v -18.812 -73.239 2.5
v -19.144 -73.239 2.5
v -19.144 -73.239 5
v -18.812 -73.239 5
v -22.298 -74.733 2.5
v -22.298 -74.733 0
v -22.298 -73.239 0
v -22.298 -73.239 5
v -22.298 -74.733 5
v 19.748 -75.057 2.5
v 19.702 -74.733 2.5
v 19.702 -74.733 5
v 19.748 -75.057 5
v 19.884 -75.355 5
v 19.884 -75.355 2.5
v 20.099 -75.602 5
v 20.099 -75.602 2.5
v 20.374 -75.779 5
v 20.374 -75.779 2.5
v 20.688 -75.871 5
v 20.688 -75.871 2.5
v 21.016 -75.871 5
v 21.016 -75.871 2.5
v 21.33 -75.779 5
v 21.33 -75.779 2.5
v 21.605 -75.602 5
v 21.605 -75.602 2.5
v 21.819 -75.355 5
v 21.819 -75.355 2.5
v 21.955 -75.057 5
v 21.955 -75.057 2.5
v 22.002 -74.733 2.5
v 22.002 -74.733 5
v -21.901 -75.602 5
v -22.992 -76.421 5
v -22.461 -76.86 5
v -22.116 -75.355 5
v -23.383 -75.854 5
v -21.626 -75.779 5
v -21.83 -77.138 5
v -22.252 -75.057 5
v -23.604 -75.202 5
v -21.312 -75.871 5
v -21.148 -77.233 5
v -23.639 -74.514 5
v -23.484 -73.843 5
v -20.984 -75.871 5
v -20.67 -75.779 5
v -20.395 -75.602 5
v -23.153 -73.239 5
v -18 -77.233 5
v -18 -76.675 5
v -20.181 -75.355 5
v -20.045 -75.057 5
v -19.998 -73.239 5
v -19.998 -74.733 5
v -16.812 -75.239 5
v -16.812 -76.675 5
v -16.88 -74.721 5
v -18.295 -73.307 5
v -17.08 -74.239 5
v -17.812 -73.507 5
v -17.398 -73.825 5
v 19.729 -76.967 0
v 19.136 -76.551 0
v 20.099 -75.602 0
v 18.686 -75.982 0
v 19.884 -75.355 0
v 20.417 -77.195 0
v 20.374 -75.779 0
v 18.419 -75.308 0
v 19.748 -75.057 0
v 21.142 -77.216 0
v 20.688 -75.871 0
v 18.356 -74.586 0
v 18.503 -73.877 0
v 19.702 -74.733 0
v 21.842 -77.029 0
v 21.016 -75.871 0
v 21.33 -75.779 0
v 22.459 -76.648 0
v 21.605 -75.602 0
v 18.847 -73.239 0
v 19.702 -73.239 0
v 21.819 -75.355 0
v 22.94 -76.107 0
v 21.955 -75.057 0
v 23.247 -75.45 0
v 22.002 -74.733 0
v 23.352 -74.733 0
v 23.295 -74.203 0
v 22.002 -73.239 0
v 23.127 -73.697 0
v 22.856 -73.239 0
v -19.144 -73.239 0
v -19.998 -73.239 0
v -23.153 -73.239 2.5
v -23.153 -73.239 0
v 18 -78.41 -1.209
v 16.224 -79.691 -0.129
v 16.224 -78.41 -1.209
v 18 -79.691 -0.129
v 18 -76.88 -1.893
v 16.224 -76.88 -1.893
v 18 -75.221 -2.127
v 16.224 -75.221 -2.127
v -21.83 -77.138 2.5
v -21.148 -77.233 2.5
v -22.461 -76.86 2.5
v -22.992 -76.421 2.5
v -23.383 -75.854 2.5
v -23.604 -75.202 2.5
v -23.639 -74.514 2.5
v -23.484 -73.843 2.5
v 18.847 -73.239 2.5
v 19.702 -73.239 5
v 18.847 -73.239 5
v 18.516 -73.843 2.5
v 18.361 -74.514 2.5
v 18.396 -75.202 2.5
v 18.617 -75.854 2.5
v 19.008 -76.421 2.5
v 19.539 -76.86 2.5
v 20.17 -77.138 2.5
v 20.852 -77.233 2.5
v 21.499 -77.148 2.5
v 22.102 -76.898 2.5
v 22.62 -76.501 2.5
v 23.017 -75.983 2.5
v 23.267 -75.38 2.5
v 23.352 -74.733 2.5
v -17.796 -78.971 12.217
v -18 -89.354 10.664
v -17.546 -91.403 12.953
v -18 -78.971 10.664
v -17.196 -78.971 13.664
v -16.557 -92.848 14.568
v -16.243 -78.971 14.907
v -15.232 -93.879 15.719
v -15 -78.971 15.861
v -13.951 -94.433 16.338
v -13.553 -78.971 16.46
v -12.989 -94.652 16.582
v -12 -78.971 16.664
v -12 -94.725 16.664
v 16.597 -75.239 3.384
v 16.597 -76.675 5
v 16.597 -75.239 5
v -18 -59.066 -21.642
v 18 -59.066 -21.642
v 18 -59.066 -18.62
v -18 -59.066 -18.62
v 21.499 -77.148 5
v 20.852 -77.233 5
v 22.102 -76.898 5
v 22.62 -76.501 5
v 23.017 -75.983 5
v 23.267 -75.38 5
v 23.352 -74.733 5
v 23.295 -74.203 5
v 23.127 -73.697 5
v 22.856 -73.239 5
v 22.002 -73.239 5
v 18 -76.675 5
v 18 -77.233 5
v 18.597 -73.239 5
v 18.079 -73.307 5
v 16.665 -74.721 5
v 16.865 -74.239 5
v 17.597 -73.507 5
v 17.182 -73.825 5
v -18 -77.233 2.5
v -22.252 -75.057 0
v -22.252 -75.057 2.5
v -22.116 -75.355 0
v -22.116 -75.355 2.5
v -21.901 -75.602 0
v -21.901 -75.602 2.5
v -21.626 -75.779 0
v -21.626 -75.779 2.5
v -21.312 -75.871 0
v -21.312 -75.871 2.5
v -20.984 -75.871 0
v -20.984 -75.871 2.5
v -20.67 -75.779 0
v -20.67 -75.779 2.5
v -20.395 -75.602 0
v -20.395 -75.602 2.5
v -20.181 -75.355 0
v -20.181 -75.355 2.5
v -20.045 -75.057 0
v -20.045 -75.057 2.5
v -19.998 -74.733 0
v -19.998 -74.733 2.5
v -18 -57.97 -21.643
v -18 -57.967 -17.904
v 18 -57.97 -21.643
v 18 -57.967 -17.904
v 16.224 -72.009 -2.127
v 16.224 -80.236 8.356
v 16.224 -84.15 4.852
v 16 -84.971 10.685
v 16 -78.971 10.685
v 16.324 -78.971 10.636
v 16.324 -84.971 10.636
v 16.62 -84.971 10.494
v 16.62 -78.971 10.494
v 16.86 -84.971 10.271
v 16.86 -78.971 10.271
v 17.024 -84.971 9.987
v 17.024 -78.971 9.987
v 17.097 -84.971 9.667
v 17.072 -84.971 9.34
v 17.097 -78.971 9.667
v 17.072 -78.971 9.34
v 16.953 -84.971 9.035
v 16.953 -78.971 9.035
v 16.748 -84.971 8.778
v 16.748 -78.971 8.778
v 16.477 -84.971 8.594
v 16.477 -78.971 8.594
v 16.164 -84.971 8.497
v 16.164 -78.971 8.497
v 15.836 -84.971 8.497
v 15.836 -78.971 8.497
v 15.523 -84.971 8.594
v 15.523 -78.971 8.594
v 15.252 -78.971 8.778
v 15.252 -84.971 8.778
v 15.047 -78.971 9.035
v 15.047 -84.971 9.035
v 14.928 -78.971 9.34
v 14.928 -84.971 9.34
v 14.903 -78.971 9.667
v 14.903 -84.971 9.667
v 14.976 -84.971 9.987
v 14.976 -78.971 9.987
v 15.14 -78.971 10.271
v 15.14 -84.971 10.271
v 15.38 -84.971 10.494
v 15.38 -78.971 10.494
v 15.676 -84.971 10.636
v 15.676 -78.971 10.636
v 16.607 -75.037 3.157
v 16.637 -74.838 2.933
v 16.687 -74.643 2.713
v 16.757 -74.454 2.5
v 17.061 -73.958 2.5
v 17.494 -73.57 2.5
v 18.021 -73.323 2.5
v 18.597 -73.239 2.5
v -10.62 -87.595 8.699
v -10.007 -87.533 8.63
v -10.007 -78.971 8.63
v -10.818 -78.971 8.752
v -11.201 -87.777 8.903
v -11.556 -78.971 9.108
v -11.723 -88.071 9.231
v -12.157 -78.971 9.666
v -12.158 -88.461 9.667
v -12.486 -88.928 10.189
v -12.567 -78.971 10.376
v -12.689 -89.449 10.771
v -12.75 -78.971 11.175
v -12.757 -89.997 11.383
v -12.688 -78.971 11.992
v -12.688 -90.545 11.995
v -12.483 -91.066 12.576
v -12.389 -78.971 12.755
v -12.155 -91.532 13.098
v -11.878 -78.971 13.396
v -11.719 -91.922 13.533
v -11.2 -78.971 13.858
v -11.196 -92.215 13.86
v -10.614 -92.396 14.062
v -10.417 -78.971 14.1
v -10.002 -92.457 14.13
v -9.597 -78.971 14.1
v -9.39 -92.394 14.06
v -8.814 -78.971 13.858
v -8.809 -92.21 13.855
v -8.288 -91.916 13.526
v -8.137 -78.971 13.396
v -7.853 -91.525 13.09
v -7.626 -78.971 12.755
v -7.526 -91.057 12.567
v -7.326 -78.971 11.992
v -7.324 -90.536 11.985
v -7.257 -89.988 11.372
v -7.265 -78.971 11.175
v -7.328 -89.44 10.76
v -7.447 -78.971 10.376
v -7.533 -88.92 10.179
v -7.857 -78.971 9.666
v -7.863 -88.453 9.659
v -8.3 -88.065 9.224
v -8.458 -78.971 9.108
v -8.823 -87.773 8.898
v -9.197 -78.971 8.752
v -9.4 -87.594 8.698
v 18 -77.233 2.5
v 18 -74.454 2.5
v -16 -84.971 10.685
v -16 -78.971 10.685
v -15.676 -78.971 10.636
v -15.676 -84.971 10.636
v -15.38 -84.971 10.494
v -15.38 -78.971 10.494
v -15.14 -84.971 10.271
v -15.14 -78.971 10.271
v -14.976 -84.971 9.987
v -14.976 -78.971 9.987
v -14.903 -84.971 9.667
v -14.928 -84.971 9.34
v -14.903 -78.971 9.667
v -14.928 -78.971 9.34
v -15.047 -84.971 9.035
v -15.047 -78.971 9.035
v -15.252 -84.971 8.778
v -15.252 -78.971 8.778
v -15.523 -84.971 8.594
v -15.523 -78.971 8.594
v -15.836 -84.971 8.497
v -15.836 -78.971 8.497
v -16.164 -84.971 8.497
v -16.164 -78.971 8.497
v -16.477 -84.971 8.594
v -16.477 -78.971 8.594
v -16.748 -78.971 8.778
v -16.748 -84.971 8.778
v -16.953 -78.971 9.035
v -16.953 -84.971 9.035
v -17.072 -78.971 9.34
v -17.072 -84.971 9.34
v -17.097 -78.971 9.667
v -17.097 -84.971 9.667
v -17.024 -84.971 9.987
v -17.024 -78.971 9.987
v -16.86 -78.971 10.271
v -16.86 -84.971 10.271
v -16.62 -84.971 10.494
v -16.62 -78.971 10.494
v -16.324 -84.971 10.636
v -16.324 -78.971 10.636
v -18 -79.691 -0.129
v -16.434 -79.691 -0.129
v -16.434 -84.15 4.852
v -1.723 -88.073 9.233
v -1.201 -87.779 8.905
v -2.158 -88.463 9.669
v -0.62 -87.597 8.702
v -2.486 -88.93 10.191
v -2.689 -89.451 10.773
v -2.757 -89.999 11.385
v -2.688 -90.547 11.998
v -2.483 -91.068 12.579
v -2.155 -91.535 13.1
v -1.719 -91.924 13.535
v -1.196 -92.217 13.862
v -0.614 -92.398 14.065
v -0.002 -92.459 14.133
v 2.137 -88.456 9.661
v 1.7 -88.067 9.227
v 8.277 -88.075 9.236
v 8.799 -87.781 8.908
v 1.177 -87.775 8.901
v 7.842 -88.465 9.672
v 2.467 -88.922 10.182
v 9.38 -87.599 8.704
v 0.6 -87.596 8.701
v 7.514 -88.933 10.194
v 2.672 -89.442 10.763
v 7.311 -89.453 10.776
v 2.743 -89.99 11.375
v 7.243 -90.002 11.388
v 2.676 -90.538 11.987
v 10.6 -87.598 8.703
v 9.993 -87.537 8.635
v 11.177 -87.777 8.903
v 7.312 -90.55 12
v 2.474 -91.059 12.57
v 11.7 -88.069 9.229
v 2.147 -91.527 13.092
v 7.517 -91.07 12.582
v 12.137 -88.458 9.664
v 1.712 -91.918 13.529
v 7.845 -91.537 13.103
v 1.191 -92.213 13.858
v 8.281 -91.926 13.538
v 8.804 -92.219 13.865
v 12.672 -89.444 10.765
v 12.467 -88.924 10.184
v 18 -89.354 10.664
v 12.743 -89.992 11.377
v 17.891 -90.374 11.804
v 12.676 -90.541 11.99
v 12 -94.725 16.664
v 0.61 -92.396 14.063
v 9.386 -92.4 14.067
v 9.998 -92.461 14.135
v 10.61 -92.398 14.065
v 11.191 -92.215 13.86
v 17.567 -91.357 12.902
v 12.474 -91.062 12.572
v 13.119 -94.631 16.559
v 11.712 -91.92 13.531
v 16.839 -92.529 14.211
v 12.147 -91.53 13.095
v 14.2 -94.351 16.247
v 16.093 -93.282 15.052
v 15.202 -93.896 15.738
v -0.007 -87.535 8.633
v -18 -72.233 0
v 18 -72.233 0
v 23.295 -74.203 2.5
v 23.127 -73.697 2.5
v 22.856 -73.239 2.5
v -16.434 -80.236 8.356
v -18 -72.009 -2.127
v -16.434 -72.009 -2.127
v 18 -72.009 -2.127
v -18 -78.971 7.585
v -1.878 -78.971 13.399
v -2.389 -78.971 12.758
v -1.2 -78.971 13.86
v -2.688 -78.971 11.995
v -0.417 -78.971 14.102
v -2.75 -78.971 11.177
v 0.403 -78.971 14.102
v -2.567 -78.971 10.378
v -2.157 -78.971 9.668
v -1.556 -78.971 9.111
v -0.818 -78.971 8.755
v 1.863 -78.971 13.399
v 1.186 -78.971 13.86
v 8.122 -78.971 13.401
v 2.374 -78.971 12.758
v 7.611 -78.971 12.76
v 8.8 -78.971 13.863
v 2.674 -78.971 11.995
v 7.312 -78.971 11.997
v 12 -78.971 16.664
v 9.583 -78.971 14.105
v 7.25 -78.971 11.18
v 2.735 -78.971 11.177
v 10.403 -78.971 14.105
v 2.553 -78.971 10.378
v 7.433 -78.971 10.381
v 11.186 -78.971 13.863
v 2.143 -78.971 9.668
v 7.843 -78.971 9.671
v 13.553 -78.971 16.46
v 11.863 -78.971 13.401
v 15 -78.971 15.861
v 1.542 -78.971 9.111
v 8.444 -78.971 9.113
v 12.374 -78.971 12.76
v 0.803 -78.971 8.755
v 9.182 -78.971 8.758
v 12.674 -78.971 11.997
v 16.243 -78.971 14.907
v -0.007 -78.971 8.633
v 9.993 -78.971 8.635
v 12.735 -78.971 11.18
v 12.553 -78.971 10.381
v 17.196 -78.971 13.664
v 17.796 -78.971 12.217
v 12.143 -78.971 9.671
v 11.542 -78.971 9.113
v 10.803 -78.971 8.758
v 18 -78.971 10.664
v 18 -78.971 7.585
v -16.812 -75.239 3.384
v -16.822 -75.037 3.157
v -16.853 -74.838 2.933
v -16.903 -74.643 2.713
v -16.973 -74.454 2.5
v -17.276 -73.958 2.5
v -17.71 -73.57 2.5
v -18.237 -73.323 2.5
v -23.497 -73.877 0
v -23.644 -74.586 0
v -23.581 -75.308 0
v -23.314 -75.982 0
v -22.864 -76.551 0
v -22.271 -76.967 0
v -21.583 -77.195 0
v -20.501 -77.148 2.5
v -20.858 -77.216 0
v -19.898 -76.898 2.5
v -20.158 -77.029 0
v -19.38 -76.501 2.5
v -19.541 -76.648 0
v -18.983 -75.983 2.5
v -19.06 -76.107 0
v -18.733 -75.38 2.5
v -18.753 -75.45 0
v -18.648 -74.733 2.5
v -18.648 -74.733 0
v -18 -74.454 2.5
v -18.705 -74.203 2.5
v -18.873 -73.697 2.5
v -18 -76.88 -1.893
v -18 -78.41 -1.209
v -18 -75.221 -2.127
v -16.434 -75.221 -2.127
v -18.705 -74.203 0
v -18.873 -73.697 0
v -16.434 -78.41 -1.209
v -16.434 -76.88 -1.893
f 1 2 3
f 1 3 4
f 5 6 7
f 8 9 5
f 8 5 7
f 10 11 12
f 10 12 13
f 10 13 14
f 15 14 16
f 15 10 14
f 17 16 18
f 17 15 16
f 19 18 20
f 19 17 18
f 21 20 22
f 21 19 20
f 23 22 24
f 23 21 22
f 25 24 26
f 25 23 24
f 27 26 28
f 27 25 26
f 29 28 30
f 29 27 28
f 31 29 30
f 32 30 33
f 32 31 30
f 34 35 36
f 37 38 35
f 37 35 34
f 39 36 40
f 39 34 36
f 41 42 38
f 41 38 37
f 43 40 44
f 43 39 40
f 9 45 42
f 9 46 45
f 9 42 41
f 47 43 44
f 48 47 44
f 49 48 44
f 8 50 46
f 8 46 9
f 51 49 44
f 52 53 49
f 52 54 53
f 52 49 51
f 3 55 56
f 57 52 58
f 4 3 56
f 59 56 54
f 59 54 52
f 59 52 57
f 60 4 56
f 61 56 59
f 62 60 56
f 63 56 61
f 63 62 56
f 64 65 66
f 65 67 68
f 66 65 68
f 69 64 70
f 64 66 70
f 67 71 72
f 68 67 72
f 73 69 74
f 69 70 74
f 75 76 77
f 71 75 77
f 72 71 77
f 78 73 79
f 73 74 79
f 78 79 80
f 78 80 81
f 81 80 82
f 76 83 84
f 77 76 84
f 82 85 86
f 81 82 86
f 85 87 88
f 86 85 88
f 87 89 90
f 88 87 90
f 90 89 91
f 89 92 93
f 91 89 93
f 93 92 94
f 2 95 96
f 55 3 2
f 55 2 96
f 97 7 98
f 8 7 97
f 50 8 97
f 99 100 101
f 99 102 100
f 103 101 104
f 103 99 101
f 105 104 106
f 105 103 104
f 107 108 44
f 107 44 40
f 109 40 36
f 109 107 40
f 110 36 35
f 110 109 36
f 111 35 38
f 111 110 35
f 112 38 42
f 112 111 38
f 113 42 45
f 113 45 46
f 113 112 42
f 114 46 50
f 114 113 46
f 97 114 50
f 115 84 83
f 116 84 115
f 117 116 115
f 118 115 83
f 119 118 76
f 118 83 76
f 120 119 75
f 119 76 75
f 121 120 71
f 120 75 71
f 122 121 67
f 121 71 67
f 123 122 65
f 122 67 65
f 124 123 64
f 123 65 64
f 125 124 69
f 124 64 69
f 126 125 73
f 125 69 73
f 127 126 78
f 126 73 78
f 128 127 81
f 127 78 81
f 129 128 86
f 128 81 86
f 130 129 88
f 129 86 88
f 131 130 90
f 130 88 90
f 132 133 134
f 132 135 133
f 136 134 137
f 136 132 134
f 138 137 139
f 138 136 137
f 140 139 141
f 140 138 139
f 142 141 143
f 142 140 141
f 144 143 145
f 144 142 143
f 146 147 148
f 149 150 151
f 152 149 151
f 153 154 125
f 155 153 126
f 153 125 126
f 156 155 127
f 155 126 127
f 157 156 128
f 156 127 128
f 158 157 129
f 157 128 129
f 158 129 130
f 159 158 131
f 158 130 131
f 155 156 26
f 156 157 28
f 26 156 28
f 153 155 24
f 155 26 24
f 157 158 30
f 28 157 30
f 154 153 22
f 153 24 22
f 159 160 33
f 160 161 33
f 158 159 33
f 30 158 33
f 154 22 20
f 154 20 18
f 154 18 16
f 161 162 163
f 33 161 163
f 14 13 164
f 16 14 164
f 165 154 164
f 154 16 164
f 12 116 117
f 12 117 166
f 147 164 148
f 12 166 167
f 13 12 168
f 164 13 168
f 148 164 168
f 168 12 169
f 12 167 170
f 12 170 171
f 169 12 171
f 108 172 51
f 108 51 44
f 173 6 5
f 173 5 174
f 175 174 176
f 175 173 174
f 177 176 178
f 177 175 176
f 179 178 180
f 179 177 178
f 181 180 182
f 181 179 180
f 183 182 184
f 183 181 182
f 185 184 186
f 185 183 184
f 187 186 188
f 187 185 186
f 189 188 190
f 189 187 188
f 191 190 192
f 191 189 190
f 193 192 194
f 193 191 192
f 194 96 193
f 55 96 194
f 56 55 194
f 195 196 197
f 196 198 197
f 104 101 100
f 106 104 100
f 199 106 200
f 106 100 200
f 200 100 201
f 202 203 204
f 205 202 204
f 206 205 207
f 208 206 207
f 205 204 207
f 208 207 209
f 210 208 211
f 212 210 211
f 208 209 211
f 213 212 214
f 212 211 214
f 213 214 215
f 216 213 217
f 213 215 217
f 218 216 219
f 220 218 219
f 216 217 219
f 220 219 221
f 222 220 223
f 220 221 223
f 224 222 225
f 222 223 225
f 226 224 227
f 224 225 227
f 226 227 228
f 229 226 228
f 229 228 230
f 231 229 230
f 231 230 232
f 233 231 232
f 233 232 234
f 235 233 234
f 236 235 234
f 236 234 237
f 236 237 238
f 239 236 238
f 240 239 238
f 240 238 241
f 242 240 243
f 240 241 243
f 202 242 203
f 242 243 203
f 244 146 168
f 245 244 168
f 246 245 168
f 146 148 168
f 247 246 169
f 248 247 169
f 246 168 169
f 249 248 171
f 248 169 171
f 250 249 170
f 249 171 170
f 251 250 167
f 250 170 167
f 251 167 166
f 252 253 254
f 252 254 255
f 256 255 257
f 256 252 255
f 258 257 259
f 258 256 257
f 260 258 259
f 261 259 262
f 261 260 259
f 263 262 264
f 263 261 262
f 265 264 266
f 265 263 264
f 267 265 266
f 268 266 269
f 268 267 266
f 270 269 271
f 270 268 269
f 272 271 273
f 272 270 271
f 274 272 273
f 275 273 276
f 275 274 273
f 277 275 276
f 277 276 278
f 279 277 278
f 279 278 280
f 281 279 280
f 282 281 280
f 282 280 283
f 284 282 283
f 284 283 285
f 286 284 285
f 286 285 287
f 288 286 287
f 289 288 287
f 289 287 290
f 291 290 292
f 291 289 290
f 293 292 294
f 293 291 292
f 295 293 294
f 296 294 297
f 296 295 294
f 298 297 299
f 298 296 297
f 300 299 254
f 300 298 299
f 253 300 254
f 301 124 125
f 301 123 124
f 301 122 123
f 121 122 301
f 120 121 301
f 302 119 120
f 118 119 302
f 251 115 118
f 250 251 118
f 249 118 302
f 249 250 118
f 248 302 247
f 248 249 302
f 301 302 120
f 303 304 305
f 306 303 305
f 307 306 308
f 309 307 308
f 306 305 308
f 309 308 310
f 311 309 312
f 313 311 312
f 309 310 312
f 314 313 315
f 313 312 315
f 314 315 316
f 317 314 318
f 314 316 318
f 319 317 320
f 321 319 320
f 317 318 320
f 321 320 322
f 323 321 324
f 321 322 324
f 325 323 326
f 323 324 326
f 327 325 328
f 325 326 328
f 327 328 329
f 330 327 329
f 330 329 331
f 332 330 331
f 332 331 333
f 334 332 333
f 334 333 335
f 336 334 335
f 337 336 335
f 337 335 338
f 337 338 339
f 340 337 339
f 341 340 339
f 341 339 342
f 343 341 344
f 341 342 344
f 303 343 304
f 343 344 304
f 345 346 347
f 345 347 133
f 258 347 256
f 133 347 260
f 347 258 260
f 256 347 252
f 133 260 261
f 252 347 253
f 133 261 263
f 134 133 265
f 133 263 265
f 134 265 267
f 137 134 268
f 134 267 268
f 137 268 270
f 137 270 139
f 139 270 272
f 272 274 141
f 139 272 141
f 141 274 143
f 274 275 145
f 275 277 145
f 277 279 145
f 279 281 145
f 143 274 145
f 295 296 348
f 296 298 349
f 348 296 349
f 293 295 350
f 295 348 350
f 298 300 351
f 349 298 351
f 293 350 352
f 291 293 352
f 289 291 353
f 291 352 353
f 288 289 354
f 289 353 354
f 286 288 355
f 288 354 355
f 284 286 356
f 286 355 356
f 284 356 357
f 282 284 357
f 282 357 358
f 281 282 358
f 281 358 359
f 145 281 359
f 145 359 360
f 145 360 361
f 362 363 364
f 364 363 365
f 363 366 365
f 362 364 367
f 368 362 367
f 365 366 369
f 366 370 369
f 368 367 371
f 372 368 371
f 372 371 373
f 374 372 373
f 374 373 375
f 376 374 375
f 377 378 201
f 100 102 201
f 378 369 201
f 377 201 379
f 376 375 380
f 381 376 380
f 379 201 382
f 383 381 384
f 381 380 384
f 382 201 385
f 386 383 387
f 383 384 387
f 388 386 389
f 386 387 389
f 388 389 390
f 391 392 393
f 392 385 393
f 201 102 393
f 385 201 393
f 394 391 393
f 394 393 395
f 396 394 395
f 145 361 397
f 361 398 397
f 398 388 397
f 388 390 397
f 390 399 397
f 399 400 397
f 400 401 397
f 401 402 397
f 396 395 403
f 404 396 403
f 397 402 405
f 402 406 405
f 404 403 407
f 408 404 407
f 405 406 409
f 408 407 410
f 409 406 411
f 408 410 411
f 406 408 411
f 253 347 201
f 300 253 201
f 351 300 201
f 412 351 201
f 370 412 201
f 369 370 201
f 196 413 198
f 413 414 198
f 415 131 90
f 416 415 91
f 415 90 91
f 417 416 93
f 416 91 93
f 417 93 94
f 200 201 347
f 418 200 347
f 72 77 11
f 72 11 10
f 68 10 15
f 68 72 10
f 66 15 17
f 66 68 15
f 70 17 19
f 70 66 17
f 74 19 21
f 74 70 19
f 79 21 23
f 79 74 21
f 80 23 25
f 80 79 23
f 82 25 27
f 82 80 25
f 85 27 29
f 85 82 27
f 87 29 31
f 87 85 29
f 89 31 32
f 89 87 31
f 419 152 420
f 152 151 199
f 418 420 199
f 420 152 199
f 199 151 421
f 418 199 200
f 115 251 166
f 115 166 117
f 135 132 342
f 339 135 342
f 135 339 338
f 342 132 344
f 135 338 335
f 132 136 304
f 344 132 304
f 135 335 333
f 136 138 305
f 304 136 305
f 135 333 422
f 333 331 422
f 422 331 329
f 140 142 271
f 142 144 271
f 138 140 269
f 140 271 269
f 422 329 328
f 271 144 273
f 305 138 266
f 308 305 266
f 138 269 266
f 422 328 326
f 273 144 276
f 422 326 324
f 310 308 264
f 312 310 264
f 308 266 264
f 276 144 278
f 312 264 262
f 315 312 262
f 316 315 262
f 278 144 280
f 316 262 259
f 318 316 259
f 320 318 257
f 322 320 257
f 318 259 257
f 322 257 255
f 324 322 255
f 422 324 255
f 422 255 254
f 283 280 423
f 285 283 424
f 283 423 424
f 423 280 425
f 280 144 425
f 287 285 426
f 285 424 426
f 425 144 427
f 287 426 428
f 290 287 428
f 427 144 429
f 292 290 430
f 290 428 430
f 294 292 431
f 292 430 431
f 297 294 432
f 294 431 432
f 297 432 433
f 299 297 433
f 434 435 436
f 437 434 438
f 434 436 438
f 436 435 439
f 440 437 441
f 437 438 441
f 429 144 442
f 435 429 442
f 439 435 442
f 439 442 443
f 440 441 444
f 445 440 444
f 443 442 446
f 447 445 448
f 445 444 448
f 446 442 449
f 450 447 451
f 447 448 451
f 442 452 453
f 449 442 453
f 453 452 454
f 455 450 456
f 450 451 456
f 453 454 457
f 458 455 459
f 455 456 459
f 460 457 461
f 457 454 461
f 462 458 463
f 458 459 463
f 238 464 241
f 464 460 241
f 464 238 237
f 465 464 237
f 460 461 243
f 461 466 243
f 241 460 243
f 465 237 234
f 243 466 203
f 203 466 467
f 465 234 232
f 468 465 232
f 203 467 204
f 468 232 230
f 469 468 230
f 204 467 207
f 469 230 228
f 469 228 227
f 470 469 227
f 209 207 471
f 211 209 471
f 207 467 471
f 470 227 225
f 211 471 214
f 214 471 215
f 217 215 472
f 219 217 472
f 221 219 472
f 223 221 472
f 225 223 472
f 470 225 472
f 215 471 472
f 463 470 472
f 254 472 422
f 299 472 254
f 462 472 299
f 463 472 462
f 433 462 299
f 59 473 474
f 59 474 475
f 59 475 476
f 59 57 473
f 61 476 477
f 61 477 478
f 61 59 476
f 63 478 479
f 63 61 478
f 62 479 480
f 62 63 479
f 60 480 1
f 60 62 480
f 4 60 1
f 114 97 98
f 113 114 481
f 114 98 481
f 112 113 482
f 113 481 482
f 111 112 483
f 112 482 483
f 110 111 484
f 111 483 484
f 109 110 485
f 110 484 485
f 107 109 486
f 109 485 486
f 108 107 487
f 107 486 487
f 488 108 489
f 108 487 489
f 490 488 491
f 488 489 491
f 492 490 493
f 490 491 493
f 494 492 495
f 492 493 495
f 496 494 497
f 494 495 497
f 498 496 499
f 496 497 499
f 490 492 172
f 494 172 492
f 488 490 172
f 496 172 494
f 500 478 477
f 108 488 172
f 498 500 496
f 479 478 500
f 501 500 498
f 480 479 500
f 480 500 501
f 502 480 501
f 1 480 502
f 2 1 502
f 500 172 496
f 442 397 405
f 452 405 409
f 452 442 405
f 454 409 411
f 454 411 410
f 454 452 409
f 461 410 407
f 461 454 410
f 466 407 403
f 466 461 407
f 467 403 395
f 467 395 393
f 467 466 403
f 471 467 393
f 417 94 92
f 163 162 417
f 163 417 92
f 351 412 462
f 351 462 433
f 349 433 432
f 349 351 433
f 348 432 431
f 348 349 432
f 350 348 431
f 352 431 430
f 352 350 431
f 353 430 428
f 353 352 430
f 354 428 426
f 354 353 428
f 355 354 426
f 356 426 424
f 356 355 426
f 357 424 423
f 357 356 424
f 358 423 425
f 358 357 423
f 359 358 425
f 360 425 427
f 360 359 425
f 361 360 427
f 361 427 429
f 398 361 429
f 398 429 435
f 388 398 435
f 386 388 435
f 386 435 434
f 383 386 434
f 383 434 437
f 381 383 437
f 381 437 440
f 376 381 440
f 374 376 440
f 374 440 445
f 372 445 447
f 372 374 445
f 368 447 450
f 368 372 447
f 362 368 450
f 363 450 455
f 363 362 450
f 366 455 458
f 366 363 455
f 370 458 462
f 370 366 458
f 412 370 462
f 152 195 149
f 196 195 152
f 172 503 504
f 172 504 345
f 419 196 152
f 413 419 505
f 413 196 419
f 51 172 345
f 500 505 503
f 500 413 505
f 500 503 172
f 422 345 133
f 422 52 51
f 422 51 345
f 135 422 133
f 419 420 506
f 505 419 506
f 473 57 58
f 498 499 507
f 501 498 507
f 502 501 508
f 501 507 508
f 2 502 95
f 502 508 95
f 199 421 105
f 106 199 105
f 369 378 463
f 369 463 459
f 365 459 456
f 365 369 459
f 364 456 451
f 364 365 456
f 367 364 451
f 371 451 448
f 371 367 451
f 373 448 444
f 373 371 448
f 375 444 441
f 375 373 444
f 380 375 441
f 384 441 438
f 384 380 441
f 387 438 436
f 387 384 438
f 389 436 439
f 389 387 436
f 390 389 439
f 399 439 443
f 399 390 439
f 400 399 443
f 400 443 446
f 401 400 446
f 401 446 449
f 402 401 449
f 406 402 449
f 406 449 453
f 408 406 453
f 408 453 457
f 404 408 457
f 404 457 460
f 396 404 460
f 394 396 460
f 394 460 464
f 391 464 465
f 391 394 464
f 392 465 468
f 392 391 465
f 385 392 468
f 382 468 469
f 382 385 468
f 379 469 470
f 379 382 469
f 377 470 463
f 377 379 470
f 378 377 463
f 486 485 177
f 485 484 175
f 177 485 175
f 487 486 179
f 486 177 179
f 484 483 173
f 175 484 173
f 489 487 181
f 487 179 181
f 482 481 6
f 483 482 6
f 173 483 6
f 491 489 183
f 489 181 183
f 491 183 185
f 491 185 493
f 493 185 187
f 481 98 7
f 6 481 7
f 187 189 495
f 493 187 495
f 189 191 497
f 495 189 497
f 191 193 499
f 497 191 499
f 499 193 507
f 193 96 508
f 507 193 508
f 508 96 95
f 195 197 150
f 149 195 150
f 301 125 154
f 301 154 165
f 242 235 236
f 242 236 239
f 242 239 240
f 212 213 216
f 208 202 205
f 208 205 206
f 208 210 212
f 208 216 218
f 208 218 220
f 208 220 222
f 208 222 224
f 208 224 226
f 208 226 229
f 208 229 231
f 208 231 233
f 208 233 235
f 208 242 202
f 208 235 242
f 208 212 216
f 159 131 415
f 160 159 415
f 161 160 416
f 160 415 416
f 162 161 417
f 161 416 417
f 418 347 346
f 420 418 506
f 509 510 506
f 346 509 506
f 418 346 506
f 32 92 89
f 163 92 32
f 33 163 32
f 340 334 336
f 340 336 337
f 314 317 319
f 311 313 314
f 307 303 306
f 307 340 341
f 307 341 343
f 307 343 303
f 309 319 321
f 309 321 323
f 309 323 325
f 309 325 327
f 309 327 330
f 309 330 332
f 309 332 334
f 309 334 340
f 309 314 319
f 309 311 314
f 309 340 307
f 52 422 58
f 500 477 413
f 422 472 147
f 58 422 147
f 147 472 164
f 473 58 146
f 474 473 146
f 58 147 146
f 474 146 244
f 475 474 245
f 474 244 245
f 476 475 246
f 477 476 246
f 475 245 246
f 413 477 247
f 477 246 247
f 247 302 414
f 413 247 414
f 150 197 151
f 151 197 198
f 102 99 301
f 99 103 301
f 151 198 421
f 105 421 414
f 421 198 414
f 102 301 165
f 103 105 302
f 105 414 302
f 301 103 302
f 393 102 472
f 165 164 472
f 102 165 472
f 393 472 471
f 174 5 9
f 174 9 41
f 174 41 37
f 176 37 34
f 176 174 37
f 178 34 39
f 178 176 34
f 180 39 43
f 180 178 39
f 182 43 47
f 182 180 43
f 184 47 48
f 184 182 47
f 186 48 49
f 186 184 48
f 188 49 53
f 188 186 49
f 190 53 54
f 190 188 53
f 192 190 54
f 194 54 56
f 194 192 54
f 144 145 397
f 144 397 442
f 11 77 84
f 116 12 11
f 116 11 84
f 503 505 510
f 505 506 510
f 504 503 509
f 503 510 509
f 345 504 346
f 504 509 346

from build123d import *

# Parameters (mm, degrees)
ESQUISSE1_R                  = 2.4999999999999893
ESQUISSE1_R_2                = 1.1499999999999992
EXTRUSION1_DEPTH             = 5
ESQUISSE1_R_3                = 2.5000000000000027
EXTRUSION1_2_DEPTH           = 5
EXTRUSION2_DEPTH             = 18
EXTRUSION3_DEPTH             = 2.5
ENL_V_MAT_EXTRU_1_DEPTH      = 39.32538157223775
ENL_V_MAT_EXTRU_1_DEPTH_BACK = 39.32538157223775
ESQUISSE4_R                  = 2.749999999999997
ESQUISSE4_R_2                = 2.749999999999998
CONG_3_R                     = 2
ENL_V_MAT_EXTRU_3_DEPTH      = 102.20266619760267
ENL_V_MAT_EXTRU_5_DEPTH      = 106.71602432156358
ENL_V_MAT_EXTRU_6_REACH      = 81.21
CONG_4_R                     = 6
CONG_5_R                     = 6
ESQUISSE9_R                  = 1.100000000000001
ESQUISSE9_R_2                = 1.0999999999999992
ENL_V_MAT_EXTRU_7_DEPTH      = 6


with BuildPart() as part:
    # Esquisse1 → Extrusion1 (new body)
    with BuildSketch(Plane.XY):
        with Locations((20.851873368125936, -74.73281291154764)):
            Circle(ESQUISSE1_R)
        with Locations((20.851873368125936, -74.73281291154764)):
            Circle(ESQUISSE1_R_2, mode=Mode.SUBTRACT)
    extrude(amount=EXTRUSION1_DEPTH)



with BuildPart() as body_2:
    # Esquisse1 → Extrusion1 2 (new body)
    with BuildSketch(Plane.XY):
        with Locations((-21.148126631874074, -74.73281291154764)):
            Circle(ESQUISSE1_R_3)
        with Locations((-21.148126631874074, -74.73281291154764)):
            Circle(ESQUISSE1_R_2, mode=Mode.SUBTRACT)
    extrude(amount=EXTRUSION1_2_DEPTH)


with BuildPart() as body_3:
    # Esquisse2 → Extrusion2 (new, symmetric)
    with BuildSketch(Plane(origin=(0, 0, 0), x_dir=(0, 0, -1), z_dir=(1, 0, 0))):
        Polygon((-16.664409805958893, -94.72524914650984), (-16.664409805958893, -78.97076866014885), (-7.5846798827186035, -78.97076866014885), (0, -72.23281291154765), (17.904062513857752, -57.96690094689117), (21.643440589343484, -57.97016684873832), (21.641519151826778, -60.17016600966495), (13.695222620932038, -67.54623887711948), align=None)
    extrude(amount=EXTRUSION2_DEPTH, both=True)


with BuildPart() as part_1:
    add(part.part)

    add(body_2.part)  # Extrusion3 merges body 2

    add(body_3.part)  # Extrusion3 merges body 3
    # Esquisse3 → Extrusion3 (add)
    with BuildSketch(Plane.XY.offset(2.5)):
        with BuildLine():
            Line((-23.15262617413516, -73.23883112281155), (-22.298126631874073, -73.23883112281155))
            Line((-22.298126631874073, -73.23883112281155), (-22.298126631874073, -74.73281291154764))
            ThreePointArc((-22.298126631874073, -74.73281291154764), (-21.148126631874074, -75.88281291154763), (-19.998126631874076, -74.73281291154764))
            Line((-19.998126631874076, -74.73281291154764), (-19.998126631874076, -73.23883112281155))
            Line((-19.998126631874076, -73.23883112281155), (-19.143627089612984, -73.23883112281155))
            Line((-19.143627089612984, -73.23883112281155), (-16.812156322257874, -73.23883112281158))
            Line((-16.812156322257874, -73.23883112281158), (-16.8121563222579, -77.23281291154763))
            Line((-16.8121563222579, -77.23281291154763), (-21.148126631874074, -77.23281291154764))
            ThreePointArc((-21.148126631874074, -77.23281291154764), (-23.382511834993743, -75.85420613610354), (-23.15262617413516, -73.23883112281155))
        make_face()
        with BuildLine():
            Line((18.847373825864864, -73.23883112281155), (19.701873368125938, -73.23883112281155))
            Line((19.701873368125938, -73.23883112281155), (19.701873368125938, -74.73281291154764))
            ThreePointArc((19.701873368125938, -74.73281291154764), (20.851873368125936, -75.88281291154763), (22.001873368125935, -74.73281291154764))
            Line((22.001873368125935, -74.73281291154764), (22.001873368125935, -73.23883112281155))
            Line((22.001873368125935, -73.23883112281155), (22.85637291038701, -73.23883112281155))
            ThreePointArc((22.85637291038701, -73.23883112281155), (23.0862585712456, -75.85420613610351), (20.85187336812597, -77.23281291154763))
            Line((20.85187336812597, -77.23281291154763), (16.59665054376802, -77.23281291154761))
            Line((16.59665054376802, -77.23281291154761), (16.59665054376802, -73.23883112281155))
            Line((16.59665054376802, -73.23883112281155), (18.847373825864864, -73.23883112281155))
        make_face()
    extrude(amount=EXTRUSION3_DEPTH)

    # Esquisse4 → Enlèv. mat.-Extru.1 (cut, two sides: drawn at the far end of the back side and taken through both)
    with BuildSketch(Plane(origin=(0, -78.97076866014885, 0), x_dir=(-1, 0, 0), z_dir=(0, 1, 0)).offset(-ENL_V_MAT_EXTRU_1_DEPTH_BACK)):
        with Locations(Location((-9.992794939980836, 11.38535169586409, 0), (0, 0, 270))):
            Circle(ESQUISSE4_R)
        with Locations(Location((0.00720473933372518, 11.382819165765587, 0), (0, 0, 270))):
            Circle(ESQUISSE4_R_2)
        with Locations(Location((10.007204418648286, 11.380286635667082, 0), (0, 0, 270))):
            Circle(ESQUISSE4_R_2)
    extrude(amount=ENL_V_MAT_EXTRU_1_DEPTH + ENL_V_MAT_EXTRU_1_DEPTH_BACK, mode=Mode.SUBTRACT)

    # Congé3
    cong_3_edges = [part_1.edges().sort_by_distance(p)[0] for p in [
        (-16.812156322257874, -73.23883112281158, 3.75),
        (16.59665054376802, -73.23883112281155, 3.75),
    ]]
    fillet(cong_3_edges, radius=CONG_3_R)

    # Esquisse6 → Enlèv. mat.-Extru.3 (cut, through all)
    with BuildSketch(Plane.XY.offset(5)):
        with BuildLine():
            Line((19.701873368125938, -73.23883112281155), (18.847373825864864, -73.23883112281155))
            ThreePointArc((18.847373825864864, -73.23883112281155), (20.851873368125936, -72.23281291154765), (22.85637291038701, -73.23883112281155))
            Line((22.85637291038701, -73.23883112281155), (22.001873368125935, -73.23883112281155))
            Line((22.001873368125935, -73.23883112281155), (22.001873368125935, -74.73281291154764))
            ThreePointArc((22.001873368125935, -74.73281291154764), (20.851873368125936, -75.88281291154763), (19.701873368125938, -74.73281291154764))
            Line((19.701873368125938, -74.73281291154764), (19.701873368125938, -73.23883112281155))
        make_face()
        with BuildLine():
            Line((-19.143627089612988, -73.23883112281155), (-19.998126631874076, -73.23883112281155))
            Line((-19.998126631874076, -73.23883112281155), (-19.998126631874076, -74.73281291154764))
            ThreePointArc((-19.998126631874076, -74.73281291154764), (-21.148126631874074, -75.88281291154763), (-22.298126631874073, -74.73281291154764))
            Line((-22.298126631874073, -74.73281291154764), (-22.298126631874073, -73.23883112281155))
            Line((-22.298126631874073, -73.23883112281155), (-23.15262617413516, -73.23883112281155))
            ThreePointArc((-23.15262617413516, -73.23883112281155), (-21.148126631874074, -72.23281291154764), (-19.143627089612988, -73.23883112281155))
        make_face()
    extrude(amount=-ENL_V_MAT_EXTRU_3_DEPTH, mode=Mode.SUBTRACT)

    # Esquisse7 → Enlèv. mat.-Extru.5 (cut, through all)
    with BuildSketch(Plane(origin=(18, 0, 0), x_dir=(0, 0, -1), z_dir=(1, 0, 0))):
        Polygon((22.38759689084557, -59.06637403320253), (18.619915990338253, -59.06637403320253), (2.127272735037141, -72.00940646483387), (2.127272735037142, -79.68956966642843), (22.38759689084557, -60.215467045024496), align=None)
    extrude(amount=-ENL_V_MAT_EXTRU_5_DEPTH, mode=Mode.SUBTRACT)

    # Enlèv. mat.-Extru.6: up to this plane
    enl_v_mat_extru_6_end = Plane(origin=(-23.648126631874074, -59.06637403320253, -18.619915990338253), z_dir=(0, 0.7866767496715903, 0.6173651201081433))
    # Esquisse8 → Enlèv. mat.-Extru.6 (cut, up to the surface)
    with BuildSketch(Plane(origin=(0, -44.301458010279546, -39.66022266935793), x_dir=(1, 0, 0), z_dir=(0, -0.745056791328178, -0.6670010327546427)), mode=Mode.PRIVATE) as enl_v_mat_extru_6_sk1:
        Polygon((16.22439568808015, 59.743411480582274), (-16.434037279491676, 59.74341148058227), (-16.43403727949168, 40.55997816141156), (16.22439568808015, 40.559978161411564), align=None)
    enl_v_mat_extru_6_tool1 = split(extrude(enl_v_mat_extru_6_sk1.sketch, amount=-ENL_V_MAT_EXTRU_6_REACH, mode=Mode.PRIVATE), bisect_by=enl_v_mat_extru_6_end, keep=Keep.BOTH, mode=Mode.PRIVATE)
    add(enl_v_mat_extru_6_tool1.solids().sort_by_distance((-0.104821, -77.75269, -2.294362))[0], mode=Mode.SUBTRACT)

    # Congé4
    cong_4_edges = [part_1.edges().sort_by_distance(p)[0] for p in [
        (-17.217018639745838, -77.90227429690431, -2.127272735037141),
        (17.112197844040075, -77.90227429690431, -2.127272735037141),
    ]]
    fillet(cong_4_edges, radius=CONG_4_R)

    # Congé5
    cong_5_edges = [part_1.edges().sort_by_distance(p)[0] for p in [
        (-18, -86.84800890332934, 16.664409805958893),
        (18, -86.84800890332934, 16.664409805958893),
    ]]
    fillet(cong_5_edges, radius=CONG_5_R)

    # Esquisse9 → Enlèv. mat.-Extru.7 (cut)
    with BuildSketch(Plane(origin=(0, -78.97076866014885, 0), x_dir=(-1, 0, 0), z_dir=(0, 1, 0))):
        with Locations(Location((-16, 9.584679882718603, 0), (0, 0, 90))):
            Circle(ESQUISSE9_R)
        with Locations(Location((16, 9.584679882718603, 0), (0, 0, 90))):
            Circle(ESQUISSE9_R_2)
    extrude(amount=-ENL_V_MAT_EXTRU_7_DEPTH, mode=Mode.SUBTRACT)


solid = part_1.part
